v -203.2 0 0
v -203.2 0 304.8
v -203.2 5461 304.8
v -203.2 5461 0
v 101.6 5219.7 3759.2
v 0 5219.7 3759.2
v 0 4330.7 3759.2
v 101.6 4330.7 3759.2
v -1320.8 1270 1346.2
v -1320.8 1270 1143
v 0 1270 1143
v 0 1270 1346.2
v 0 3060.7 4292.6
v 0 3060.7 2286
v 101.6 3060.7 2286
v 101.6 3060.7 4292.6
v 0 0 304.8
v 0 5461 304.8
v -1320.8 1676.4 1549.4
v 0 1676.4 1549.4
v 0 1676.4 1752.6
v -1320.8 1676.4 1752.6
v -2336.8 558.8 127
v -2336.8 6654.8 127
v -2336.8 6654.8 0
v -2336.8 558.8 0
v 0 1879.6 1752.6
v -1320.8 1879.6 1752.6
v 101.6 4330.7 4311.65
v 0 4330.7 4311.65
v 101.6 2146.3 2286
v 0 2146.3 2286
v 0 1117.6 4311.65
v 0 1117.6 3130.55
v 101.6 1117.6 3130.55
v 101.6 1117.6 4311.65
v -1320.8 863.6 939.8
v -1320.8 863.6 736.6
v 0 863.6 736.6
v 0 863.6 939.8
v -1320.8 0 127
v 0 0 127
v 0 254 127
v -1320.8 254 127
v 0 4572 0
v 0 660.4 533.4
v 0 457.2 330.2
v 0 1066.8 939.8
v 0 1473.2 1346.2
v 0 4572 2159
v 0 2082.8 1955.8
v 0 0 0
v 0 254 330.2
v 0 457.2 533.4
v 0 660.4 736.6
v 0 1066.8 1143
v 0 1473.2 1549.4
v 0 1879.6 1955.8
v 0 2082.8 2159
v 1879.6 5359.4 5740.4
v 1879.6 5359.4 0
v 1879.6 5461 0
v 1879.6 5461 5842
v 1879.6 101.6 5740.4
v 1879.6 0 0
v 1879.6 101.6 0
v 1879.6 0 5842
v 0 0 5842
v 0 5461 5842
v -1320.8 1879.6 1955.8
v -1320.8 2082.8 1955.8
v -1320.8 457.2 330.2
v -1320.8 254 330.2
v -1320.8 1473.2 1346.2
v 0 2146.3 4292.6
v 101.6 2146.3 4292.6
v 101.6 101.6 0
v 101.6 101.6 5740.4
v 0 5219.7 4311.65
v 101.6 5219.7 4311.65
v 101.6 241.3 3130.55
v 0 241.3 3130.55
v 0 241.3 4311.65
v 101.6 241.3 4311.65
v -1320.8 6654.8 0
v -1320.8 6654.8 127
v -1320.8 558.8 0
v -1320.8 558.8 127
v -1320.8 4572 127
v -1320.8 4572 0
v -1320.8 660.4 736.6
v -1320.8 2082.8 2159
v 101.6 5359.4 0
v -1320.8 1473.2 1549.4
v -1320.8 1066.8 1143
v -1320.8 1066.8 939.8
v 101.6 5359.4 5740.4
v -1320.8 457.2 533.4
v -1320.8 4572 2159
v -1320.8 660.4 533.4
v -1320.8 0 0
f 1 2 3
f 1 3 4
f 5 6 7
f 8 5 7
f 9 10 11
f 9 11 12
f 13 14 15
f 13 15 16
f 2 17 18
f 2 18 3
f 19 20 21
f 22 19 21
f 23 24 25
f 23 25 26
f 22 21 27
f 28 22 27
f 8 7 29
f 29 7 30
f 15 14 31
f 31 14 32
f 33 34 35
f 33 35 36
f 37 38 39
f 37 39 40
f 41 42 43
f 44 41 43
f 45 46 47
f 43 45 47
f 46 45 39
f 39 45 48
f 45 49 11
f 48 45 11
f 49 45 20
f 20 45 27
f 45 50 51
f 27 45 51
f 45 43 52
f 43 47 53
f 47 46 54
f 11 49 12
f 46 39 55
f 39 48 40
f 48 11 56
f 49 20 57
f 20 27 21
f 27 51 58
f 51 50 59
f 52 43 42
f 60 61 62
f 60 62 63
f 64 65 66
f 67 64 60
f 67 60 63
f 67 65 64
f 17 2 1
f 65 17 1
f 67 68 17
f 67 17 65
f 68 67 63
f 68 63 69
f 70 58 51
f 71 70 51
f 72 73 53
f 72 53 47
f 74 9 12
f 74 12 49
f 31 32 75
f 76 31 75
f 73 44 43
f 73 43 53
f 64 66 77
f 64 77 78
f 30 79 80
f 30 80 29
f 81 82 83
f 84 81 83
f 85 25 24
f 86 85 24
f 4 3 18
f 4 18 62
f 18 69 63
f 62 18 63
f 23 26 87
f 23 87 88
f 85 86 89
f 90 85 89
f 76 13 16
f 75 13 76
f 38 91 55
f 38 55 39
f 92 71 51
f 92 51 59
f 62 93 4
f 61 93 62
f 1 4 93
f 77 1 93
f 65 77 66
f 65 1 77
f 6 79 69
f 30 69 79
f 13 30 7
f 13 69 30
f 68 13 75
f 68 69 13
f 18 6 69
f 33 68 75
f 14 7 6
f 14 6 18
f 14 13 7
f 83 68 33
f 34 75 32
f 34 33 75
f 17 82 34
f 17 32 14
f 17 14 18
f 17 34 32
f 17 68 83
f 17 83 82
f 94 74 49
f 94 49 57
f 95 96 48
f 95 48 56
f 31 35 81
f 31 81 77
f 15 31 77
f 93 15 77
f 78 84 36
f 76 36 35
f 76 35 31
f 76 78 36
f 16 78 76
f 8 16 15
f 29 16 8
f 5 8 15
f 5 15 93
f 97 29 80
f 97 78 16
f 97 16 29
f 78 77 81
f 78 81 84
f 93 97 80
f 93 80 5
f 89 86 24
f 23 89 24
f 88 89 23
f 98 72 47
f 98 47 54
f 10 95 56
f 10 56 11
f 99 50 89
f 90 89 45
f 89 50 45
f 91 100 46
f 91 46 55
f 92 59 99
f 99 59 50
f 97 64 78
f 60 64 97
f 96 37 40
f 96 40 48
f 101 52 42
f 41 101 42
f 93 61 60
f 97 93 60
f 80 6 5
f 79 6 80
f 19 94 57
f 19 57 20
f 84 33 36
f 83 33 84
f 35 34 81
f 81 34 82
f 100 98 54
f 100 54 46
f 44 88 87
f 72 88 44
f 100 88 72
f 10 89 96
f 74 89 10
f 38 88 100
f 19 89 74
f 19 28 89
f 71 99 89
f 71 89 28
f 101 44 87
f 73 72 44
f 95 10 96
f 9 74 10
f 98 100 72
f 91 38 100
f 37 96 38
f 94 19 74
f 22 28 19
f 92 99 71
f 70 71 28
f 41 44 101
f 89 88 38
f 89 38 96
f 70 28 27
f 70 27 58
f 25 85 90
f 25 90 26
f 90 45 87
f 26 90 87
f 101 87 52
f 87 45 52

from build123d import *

# Parameters (mm, degrees)
F1_DEPTH = 5461
F3_W     = 5257.8
F3_H     = 5740.4
F4_DEPTH = 1778
F2_W     = 889
F2_H     = 552.45
F2_W_2   = 914.4
F2_H_2   = 2006.6
F2_W_3   = 876.3
F2_H_3   = 1181.1
F5_DEPTH = 1879.601
F7_DEPTH = 1320.8
F8_W     = 6096
F8_H     = 127
F9_DEPTH = 1016


with BuildPart() as f1:
    # F0 (on Front) → F1 (new body)
    with BuildSketch(Plane.XZ):
        Polygon((-203.2, 0), (0, 0), (1879.6, 0), (1879.6, 5842), (0, 5842), (0, 304.8), (-203.2, 304.8), align=None)
    extrude(amount=-F1_DEPTH)

    # F3 (on face) → F4 (cut)
    with BuildSketch(Plane.YZ.offset(1879.6)):
        with Locations((2730.5, 2870.2)):
            Rectangle(F3_W, F3_H)
    extrude(amount=-F4_DEPTH, mode=Mode.SUBTRACT)

    # F2 (on face) → F5 (cut, through all)
    with BuildSketch(Plane(origin=(0, 0, 0), x_dir=(0, -1, 0), z_dir=(-1, 0, 0))):
        with Locations((-4775.2, 4035.425)):
            Rectangle(F2_W, F2_H)
        with Locations((-2603.5, 3289.3)):
            Rectangle(F2_W_2, F2_H_2)
        with Locations((-679.45, 3721.1)):
            Rectangle(F2_W_3, F2_H_3)
    extrude(amount=-F5_DEPTH, mode=Mode.SUBTRACT)


with BuildPart() as f7:
    # F6 (on face) → F7 (new body)
    with BuildSketch(Plane(origin=(0, 0, 0), x_dir=(0, -1, 0), z_dir=(-1, 0, 0))):
        Polygon((-4572, 2159), (-4572, 304.8), (-4572, 0), (0, 0), (0, 127), (-254, 127), (-254, 330.2), (-457.2, 330.2), (-457.2, 533.4), (-660.4, 533.4), (-660.4, 736.6), (-863.6, 736.6), (-863.6, 939.8), (-1066.8, 939.8), (-1066.8, 1143), (-1270, 1143), (-1270, 1346.2), (-1473.2, 1346.2), (-1473.2, 1549.4), (-1676.4, 1549.4), (-1676.4, 1752.6), (-1879.6, 1752.6), (-1879.6, 1955.8), (-2082.8, 1955.8), (-2082.8, 2159), align=None)
    extrude(amount=F7_DEPTH)

    # F8 (on face) → F9 (join)
    with BuildSketch(Plane(origin=(-1320.8, 0, 0), x_dir=(0, -1, 0), z_dir=(-1, 0, 0))):
        with Locations((-3606.8, 63.5)):
            Rectangle(F8_W, F8_H)
    extrude(amount=F9_DEPTH)


solid = Compound([f1.part, f7.part])
